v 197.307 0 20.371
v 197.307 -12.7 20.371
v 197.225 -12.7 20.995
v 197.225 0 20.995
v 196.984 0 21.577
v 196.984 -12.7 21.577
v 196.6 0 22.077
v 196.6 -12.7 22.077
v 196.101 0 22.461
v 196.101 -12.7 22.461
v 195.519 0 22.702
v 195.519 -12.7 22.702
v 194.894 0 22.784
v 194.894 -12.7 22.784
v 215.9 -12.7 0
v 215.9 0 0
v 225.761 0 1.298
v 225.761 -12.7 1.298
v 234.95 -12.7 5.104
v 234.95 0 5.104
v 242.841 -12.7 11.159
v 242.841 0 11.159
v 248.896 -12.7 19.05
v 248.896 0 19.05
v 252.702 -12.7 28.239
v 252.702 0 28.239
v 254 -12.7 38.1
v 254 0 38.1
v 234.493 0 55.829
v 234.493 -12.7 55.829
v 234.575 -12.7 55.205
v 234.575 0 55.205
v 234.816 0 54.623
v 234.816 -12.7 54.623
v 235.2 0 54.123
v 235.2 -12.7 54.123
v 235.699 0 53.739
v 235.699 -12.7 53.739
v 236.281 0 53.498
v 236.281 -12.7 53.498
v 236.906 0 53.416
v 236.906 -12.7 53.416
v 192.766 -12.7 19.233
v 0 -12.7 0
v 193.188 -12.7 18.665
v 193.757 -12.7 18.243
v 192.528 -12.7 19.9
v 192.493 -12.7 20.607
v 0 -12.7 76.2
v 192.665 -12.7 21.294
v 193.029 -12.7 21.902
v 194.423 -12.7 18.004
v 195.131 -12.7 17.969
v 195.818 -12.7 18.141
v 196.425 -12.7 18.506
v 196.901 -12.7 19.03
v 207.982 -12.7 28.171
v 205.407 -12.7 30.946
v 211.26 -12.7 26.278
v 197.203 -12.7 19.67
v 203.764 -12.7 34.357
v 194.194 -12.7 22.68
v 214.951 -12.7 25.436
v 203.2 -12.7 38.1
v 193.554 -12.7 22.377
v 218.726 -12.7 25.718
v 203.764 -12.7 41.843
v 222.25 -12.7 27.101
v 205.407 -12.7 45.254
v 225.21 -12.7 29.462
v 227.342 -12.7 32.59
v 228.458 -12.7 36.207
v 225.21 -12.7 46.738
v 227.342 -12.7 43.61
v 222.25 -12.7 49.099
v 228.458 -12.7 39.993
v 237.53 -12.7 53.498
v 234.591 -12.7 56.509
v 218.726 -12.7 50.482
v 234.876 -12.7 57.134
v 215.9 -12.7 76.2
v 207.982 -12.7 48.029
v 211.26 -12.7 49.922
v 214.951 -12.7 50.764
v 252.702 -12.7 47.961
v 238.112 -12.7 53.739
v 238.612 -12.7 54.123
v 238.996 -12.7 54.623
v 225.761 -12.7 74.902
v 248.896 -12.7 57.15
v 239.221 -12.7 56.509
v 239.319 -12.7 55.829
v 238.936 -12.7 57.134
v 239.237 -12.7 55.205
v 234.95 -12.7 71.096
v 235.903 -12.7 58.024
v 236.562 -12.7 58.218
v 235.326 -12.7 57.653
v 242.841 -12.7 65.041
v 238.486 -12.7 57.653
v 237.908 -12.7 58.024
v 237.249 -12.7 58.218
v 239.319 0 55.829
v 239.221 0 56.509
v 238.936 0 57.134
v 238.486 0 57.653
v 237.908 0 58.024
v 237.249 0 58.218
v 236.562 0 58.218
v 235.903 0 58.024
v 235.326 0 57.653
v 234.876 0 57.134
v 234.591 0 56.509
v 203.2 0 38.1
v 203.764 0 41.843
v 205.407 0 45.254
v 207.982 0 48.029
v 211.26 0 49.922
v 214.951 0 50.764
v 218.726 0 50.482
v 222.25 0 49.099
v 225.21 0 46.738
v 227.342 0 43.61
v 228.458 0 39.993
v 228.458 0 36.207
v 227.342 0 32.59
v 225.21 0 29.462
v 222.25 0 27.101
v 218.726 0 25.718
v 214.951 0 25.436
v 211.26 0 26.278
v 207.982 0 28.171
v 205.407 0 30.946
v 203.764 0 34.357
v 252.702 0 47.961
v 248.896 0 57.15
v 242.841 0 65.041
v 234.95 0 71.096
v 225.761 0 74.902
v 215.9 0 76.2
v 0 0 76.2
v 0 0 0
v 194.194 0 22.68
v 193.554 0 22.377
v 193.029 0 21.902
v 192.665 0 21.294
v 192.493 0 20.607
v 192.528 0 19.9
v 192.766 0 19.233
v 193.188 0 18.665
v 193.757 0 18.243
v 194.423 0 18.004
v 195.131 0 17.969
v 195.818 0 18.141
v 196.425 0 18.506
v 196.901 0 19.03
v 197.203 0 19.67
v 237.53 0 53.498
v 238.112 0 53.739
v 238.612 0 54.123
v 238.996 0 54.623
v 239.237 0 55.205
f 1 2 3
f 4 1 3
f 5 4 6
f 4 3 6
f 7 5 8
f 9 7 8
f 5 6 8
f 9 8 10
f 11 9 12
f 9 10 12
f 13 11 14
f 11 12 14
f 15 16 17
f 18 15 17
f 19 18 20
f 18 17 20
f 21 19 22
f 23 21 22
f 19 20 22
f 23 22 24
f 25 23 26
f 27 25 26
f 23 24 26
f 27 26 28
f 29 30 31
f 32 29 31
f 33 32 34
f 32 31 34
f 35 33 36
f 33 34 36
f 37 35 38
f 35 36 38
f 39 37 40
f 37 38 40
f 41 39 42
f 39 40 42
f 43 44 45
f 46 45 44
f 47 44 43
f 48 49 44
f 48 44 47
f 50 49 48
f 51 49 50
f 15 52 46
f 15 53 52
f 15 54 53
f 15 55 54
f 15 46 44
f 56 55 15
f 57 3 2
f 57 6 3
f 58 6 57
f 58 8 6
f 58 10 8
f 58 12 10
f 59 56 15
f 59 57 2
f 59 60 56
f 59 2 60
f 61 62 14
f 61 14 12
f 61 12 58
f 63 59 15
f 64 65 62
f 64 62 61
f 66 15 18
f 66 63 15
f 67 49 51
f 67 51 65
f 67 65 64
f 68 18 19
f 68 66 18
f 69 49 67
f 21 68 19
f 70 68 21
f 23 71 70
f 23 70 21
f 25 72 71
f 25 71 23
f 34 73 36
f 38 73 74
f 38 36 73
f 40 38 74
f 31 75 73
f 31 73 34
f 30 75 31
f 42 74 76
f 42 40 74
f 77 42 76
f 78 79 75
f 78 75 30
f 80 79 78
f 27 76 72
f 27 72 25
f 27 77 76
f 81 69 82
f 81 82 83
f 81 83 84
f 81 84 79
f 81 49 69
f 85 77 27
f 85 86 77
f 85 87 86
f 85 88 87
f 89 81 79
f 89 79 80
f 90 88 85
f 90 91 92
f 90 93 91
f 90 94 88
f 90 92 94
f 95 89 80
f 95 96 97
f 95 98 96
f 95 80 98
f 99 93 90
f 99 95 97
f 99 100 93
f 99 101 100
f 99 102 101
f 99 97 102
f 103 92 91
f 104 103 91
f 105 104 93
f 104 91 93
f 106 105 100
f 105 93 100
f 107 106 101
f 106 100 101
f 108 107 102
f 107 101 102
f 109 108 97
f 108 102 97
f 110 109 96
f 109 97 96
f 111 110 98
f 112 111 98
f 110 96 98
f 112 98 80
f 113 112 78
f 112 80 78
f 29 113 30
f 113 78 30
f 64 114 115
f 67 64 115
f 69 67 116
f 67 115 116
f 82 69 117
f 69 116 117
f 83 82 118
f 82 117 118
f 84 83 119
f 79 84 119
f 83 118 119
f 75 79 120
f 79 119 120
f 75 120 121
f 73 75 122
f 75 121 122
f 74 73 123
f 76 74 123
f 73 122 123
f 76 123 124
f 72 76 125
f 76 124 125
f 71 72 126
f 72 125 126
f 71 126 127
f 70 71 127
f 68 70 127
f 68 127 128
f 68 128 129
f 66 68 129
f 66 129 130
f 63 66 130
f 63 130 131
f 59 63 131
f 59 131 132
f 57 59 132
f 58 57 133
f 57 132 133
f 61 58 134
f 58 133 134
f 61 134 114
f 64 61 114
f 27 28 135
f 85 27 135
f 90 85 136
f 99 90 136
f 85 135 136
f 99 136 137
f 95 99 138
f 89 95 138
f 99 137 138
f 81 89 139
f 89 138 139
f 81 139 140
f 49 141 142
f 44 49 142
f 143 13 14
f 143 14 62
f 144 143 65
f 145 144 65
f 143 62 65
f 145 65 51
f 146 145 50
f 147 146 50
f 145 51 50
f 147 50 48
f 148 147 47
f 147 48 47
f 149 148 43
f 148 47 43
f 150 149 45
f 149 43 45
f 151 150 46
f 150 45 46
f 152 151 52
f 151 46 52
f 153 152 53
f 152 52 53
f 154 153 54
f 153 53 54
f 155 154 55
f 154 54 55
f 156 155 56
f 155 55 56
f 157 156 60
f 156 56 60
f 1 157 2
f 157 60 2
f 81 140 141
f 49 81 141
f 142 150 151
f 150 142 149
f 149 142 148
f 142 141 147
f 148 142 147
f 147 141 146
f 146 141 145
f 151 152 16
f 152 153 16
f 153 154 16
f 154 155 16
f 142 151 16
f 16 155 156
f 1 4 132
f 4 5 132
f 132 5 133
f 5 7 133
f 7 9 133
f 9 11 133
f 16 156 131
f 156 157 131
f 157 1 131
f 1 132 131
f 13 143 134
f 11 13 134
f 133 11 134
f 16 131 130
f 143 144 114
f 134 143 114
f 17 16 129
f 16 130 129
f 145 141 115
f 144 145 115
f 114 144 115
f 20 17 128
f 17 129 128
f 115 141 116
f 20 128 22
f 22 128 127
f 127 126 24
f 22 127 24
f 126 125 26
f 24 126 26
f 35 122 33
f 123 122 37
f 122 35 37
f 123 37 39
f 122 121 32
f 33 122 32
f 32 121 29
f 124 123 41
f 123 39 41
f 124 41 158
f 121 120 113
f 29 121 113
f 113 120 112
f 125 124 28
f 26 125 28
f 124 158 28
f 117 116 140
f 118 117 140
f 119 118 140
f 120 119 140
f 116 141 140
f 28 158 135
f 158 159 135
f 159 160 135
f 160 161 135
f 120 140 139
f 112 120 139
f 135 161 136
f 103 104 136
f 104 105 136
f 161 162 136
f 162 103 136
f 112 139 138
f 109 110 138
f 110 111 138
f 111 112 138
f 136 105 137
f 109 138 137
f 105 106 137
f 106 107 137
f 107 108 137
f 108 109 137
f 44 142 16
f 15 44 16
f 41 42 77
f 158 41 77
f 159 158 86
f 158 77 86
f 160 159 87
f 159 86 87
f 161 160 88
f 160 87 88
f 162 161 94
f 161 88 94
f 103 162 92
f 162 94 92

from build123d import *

# Parameters (mm, degrees)
F1_DEPTH = 12.7
F3_DEPTH = 25.4


with BuildPart() as f1:
    # F0 (on Front) → F1 (new body)
    with BuildSketch(Plane.XZ):
        with BuildLine():
            Line((0, 38.1), (0, 0))
            Line((0, 0), (215.9, 0))
            ThreePointArc((215.9, 0), (242.840768, 11.159232), (254, 38.1))
            ThreePointArc((254, 38.1), (242.840768, 65.040768), (215.9, 76.2))
            Line((215.9, 76.2), (0, 76.2))
            Line((0, 76.2), (0, 38.1))
        make_face()
        with BuildLine():
            ThreePointArc((228.6, 38.1), (215.9, 25.4), (203.2, 38.1))
            ThreePointArc((203.2, 38.1), (215.9, 50.8), (228.6, 38.1))
        make_face(mode=Mode.SUBTRACT)
    extrude(amount=F1_DEPTH)

    # F2 (on face) → F3 (cut)
    with BuildSketch(Plane.XZ.offset(12.7)):
        with BuildLine():
            Line((194.8942, 20.3708), (194.8942, 22.7838))
            ThreePointArc((194.8942, 22.7838), (193.187951, 18.664551), (197.3072, 20.3708))
            Line((197.3072, 20.3708), (194.8942, 20.3708))
        make_face()
        with BuildLine():
            ThreePointArc((197.3072, 20.3708), (196.600449, 22.077049), (194.8942, 22.7838))
            Line((194.8942, 22.7838), (194.8942, 20.3708))
            Line((194.8942, 20.3708), (197.3072, 20.3708))
        make_face()
        with BuildLine():
            Line((236.9058, 55.8292), (234.4928, 55.8292))
            ThreePointArc((234.4928, 55.8292), (235.199551, 54.122951), (236.9058, 53.4162))
            Line((236.9058, 53.4162), (236.9058, 55.8292))
        make_face()
        with BuildLine():
            ThreePointArc((239.3188, 55.8292), (236.9058, 58.2422), (234.4928, 55.8292))
            Line((234.4928, 55.8292), (236.9058, 55.8292))
            Line((236.9058, 55.8292), (236.9058, 53.4162))
            ThreePointArc((236.9058, 53.4162), (238.612049, 54.122951), (239.3188, 55.8292))
        make_face()
    extrude(amount=-F3_DEPTH, mode=Mode.SUBTRACT)


solid = f1.part
